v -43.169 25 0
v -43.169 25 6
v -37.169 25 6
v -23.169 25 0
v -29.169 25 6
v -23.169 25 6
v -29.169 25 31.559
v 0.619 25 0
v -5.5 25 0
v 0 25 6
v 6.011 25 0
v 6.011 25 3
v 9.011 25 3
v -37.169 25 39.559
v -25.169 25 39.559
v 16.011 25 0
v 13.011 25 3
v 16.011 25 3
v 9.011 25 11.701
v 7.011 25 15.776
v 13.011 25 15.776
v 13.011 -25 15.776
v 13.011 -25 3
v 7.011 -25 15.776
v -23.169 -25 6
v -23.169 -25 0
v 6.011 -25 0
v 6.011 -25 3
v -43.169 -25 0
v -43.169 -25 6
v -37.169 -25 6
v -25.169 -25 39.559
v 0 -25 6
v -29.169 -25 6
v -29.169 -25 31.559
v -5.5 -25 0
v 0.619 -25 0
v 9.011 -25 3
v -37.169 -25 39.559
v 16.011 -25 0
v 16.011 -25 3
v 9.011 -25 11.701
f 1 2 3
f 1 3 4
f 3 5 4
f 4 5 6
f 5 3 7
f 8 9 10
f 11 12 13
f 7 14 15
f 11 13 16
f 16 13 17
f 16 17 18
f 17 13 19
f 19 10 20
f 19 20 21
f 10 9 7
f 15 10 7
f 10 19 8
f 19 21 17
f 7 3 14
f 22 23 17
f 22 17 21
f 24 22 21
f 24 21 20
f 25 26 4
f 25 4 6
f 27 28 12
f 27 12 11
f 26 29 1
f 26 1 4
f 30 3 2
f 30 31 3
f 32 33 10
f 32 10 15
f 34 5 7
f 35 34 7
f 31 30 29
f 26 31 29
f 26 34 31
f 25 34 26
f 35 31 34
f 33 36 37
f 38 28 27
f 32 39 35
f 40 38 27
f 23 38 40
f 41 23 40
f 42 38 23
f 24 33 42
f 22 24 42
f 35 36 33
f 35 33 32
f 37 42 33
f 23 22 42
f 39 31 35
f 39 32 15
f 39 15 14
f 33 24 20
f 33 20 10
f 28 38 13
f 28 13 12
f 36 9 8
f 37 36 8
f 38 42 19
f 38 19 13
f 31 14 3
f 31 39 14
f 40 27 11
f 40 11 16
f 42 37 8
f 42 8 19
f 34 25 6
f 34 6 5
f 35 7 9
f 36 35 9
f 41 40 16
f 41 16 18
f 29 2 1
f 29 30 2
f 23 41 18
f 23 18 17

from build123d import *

# Parameters (mm, degrees)
F1_DEPTH = 25


with BuildPart() as f1:
    # F0 (on Front) → F1 (new body, symmetric)
    with BuildSketch(Plane.XZ):
        Polygon((-43.168996, 6), (-43.168996, 0), (-23.168996, 0), (-23.168996, 6), (-29.168996, 6), (-29.168996, 31.558661), (-5.5, 0), (0.619155, 0), (9.011236, 11.700977), (9.011236, 3), (6.011236, 3), (6.011236, 0), (16.011236, 0), (16.011236, 3), (13.011236, 3), (13.011236, 15.775682), (7.011236, 15.775682), (0, 6), (-25.168996, 39.558661), (-37.168996, 39.558661), (-37.168996, 6), align=None)
    extrude(amount=F1_DEPTH, both=True)


solid = f1.part
